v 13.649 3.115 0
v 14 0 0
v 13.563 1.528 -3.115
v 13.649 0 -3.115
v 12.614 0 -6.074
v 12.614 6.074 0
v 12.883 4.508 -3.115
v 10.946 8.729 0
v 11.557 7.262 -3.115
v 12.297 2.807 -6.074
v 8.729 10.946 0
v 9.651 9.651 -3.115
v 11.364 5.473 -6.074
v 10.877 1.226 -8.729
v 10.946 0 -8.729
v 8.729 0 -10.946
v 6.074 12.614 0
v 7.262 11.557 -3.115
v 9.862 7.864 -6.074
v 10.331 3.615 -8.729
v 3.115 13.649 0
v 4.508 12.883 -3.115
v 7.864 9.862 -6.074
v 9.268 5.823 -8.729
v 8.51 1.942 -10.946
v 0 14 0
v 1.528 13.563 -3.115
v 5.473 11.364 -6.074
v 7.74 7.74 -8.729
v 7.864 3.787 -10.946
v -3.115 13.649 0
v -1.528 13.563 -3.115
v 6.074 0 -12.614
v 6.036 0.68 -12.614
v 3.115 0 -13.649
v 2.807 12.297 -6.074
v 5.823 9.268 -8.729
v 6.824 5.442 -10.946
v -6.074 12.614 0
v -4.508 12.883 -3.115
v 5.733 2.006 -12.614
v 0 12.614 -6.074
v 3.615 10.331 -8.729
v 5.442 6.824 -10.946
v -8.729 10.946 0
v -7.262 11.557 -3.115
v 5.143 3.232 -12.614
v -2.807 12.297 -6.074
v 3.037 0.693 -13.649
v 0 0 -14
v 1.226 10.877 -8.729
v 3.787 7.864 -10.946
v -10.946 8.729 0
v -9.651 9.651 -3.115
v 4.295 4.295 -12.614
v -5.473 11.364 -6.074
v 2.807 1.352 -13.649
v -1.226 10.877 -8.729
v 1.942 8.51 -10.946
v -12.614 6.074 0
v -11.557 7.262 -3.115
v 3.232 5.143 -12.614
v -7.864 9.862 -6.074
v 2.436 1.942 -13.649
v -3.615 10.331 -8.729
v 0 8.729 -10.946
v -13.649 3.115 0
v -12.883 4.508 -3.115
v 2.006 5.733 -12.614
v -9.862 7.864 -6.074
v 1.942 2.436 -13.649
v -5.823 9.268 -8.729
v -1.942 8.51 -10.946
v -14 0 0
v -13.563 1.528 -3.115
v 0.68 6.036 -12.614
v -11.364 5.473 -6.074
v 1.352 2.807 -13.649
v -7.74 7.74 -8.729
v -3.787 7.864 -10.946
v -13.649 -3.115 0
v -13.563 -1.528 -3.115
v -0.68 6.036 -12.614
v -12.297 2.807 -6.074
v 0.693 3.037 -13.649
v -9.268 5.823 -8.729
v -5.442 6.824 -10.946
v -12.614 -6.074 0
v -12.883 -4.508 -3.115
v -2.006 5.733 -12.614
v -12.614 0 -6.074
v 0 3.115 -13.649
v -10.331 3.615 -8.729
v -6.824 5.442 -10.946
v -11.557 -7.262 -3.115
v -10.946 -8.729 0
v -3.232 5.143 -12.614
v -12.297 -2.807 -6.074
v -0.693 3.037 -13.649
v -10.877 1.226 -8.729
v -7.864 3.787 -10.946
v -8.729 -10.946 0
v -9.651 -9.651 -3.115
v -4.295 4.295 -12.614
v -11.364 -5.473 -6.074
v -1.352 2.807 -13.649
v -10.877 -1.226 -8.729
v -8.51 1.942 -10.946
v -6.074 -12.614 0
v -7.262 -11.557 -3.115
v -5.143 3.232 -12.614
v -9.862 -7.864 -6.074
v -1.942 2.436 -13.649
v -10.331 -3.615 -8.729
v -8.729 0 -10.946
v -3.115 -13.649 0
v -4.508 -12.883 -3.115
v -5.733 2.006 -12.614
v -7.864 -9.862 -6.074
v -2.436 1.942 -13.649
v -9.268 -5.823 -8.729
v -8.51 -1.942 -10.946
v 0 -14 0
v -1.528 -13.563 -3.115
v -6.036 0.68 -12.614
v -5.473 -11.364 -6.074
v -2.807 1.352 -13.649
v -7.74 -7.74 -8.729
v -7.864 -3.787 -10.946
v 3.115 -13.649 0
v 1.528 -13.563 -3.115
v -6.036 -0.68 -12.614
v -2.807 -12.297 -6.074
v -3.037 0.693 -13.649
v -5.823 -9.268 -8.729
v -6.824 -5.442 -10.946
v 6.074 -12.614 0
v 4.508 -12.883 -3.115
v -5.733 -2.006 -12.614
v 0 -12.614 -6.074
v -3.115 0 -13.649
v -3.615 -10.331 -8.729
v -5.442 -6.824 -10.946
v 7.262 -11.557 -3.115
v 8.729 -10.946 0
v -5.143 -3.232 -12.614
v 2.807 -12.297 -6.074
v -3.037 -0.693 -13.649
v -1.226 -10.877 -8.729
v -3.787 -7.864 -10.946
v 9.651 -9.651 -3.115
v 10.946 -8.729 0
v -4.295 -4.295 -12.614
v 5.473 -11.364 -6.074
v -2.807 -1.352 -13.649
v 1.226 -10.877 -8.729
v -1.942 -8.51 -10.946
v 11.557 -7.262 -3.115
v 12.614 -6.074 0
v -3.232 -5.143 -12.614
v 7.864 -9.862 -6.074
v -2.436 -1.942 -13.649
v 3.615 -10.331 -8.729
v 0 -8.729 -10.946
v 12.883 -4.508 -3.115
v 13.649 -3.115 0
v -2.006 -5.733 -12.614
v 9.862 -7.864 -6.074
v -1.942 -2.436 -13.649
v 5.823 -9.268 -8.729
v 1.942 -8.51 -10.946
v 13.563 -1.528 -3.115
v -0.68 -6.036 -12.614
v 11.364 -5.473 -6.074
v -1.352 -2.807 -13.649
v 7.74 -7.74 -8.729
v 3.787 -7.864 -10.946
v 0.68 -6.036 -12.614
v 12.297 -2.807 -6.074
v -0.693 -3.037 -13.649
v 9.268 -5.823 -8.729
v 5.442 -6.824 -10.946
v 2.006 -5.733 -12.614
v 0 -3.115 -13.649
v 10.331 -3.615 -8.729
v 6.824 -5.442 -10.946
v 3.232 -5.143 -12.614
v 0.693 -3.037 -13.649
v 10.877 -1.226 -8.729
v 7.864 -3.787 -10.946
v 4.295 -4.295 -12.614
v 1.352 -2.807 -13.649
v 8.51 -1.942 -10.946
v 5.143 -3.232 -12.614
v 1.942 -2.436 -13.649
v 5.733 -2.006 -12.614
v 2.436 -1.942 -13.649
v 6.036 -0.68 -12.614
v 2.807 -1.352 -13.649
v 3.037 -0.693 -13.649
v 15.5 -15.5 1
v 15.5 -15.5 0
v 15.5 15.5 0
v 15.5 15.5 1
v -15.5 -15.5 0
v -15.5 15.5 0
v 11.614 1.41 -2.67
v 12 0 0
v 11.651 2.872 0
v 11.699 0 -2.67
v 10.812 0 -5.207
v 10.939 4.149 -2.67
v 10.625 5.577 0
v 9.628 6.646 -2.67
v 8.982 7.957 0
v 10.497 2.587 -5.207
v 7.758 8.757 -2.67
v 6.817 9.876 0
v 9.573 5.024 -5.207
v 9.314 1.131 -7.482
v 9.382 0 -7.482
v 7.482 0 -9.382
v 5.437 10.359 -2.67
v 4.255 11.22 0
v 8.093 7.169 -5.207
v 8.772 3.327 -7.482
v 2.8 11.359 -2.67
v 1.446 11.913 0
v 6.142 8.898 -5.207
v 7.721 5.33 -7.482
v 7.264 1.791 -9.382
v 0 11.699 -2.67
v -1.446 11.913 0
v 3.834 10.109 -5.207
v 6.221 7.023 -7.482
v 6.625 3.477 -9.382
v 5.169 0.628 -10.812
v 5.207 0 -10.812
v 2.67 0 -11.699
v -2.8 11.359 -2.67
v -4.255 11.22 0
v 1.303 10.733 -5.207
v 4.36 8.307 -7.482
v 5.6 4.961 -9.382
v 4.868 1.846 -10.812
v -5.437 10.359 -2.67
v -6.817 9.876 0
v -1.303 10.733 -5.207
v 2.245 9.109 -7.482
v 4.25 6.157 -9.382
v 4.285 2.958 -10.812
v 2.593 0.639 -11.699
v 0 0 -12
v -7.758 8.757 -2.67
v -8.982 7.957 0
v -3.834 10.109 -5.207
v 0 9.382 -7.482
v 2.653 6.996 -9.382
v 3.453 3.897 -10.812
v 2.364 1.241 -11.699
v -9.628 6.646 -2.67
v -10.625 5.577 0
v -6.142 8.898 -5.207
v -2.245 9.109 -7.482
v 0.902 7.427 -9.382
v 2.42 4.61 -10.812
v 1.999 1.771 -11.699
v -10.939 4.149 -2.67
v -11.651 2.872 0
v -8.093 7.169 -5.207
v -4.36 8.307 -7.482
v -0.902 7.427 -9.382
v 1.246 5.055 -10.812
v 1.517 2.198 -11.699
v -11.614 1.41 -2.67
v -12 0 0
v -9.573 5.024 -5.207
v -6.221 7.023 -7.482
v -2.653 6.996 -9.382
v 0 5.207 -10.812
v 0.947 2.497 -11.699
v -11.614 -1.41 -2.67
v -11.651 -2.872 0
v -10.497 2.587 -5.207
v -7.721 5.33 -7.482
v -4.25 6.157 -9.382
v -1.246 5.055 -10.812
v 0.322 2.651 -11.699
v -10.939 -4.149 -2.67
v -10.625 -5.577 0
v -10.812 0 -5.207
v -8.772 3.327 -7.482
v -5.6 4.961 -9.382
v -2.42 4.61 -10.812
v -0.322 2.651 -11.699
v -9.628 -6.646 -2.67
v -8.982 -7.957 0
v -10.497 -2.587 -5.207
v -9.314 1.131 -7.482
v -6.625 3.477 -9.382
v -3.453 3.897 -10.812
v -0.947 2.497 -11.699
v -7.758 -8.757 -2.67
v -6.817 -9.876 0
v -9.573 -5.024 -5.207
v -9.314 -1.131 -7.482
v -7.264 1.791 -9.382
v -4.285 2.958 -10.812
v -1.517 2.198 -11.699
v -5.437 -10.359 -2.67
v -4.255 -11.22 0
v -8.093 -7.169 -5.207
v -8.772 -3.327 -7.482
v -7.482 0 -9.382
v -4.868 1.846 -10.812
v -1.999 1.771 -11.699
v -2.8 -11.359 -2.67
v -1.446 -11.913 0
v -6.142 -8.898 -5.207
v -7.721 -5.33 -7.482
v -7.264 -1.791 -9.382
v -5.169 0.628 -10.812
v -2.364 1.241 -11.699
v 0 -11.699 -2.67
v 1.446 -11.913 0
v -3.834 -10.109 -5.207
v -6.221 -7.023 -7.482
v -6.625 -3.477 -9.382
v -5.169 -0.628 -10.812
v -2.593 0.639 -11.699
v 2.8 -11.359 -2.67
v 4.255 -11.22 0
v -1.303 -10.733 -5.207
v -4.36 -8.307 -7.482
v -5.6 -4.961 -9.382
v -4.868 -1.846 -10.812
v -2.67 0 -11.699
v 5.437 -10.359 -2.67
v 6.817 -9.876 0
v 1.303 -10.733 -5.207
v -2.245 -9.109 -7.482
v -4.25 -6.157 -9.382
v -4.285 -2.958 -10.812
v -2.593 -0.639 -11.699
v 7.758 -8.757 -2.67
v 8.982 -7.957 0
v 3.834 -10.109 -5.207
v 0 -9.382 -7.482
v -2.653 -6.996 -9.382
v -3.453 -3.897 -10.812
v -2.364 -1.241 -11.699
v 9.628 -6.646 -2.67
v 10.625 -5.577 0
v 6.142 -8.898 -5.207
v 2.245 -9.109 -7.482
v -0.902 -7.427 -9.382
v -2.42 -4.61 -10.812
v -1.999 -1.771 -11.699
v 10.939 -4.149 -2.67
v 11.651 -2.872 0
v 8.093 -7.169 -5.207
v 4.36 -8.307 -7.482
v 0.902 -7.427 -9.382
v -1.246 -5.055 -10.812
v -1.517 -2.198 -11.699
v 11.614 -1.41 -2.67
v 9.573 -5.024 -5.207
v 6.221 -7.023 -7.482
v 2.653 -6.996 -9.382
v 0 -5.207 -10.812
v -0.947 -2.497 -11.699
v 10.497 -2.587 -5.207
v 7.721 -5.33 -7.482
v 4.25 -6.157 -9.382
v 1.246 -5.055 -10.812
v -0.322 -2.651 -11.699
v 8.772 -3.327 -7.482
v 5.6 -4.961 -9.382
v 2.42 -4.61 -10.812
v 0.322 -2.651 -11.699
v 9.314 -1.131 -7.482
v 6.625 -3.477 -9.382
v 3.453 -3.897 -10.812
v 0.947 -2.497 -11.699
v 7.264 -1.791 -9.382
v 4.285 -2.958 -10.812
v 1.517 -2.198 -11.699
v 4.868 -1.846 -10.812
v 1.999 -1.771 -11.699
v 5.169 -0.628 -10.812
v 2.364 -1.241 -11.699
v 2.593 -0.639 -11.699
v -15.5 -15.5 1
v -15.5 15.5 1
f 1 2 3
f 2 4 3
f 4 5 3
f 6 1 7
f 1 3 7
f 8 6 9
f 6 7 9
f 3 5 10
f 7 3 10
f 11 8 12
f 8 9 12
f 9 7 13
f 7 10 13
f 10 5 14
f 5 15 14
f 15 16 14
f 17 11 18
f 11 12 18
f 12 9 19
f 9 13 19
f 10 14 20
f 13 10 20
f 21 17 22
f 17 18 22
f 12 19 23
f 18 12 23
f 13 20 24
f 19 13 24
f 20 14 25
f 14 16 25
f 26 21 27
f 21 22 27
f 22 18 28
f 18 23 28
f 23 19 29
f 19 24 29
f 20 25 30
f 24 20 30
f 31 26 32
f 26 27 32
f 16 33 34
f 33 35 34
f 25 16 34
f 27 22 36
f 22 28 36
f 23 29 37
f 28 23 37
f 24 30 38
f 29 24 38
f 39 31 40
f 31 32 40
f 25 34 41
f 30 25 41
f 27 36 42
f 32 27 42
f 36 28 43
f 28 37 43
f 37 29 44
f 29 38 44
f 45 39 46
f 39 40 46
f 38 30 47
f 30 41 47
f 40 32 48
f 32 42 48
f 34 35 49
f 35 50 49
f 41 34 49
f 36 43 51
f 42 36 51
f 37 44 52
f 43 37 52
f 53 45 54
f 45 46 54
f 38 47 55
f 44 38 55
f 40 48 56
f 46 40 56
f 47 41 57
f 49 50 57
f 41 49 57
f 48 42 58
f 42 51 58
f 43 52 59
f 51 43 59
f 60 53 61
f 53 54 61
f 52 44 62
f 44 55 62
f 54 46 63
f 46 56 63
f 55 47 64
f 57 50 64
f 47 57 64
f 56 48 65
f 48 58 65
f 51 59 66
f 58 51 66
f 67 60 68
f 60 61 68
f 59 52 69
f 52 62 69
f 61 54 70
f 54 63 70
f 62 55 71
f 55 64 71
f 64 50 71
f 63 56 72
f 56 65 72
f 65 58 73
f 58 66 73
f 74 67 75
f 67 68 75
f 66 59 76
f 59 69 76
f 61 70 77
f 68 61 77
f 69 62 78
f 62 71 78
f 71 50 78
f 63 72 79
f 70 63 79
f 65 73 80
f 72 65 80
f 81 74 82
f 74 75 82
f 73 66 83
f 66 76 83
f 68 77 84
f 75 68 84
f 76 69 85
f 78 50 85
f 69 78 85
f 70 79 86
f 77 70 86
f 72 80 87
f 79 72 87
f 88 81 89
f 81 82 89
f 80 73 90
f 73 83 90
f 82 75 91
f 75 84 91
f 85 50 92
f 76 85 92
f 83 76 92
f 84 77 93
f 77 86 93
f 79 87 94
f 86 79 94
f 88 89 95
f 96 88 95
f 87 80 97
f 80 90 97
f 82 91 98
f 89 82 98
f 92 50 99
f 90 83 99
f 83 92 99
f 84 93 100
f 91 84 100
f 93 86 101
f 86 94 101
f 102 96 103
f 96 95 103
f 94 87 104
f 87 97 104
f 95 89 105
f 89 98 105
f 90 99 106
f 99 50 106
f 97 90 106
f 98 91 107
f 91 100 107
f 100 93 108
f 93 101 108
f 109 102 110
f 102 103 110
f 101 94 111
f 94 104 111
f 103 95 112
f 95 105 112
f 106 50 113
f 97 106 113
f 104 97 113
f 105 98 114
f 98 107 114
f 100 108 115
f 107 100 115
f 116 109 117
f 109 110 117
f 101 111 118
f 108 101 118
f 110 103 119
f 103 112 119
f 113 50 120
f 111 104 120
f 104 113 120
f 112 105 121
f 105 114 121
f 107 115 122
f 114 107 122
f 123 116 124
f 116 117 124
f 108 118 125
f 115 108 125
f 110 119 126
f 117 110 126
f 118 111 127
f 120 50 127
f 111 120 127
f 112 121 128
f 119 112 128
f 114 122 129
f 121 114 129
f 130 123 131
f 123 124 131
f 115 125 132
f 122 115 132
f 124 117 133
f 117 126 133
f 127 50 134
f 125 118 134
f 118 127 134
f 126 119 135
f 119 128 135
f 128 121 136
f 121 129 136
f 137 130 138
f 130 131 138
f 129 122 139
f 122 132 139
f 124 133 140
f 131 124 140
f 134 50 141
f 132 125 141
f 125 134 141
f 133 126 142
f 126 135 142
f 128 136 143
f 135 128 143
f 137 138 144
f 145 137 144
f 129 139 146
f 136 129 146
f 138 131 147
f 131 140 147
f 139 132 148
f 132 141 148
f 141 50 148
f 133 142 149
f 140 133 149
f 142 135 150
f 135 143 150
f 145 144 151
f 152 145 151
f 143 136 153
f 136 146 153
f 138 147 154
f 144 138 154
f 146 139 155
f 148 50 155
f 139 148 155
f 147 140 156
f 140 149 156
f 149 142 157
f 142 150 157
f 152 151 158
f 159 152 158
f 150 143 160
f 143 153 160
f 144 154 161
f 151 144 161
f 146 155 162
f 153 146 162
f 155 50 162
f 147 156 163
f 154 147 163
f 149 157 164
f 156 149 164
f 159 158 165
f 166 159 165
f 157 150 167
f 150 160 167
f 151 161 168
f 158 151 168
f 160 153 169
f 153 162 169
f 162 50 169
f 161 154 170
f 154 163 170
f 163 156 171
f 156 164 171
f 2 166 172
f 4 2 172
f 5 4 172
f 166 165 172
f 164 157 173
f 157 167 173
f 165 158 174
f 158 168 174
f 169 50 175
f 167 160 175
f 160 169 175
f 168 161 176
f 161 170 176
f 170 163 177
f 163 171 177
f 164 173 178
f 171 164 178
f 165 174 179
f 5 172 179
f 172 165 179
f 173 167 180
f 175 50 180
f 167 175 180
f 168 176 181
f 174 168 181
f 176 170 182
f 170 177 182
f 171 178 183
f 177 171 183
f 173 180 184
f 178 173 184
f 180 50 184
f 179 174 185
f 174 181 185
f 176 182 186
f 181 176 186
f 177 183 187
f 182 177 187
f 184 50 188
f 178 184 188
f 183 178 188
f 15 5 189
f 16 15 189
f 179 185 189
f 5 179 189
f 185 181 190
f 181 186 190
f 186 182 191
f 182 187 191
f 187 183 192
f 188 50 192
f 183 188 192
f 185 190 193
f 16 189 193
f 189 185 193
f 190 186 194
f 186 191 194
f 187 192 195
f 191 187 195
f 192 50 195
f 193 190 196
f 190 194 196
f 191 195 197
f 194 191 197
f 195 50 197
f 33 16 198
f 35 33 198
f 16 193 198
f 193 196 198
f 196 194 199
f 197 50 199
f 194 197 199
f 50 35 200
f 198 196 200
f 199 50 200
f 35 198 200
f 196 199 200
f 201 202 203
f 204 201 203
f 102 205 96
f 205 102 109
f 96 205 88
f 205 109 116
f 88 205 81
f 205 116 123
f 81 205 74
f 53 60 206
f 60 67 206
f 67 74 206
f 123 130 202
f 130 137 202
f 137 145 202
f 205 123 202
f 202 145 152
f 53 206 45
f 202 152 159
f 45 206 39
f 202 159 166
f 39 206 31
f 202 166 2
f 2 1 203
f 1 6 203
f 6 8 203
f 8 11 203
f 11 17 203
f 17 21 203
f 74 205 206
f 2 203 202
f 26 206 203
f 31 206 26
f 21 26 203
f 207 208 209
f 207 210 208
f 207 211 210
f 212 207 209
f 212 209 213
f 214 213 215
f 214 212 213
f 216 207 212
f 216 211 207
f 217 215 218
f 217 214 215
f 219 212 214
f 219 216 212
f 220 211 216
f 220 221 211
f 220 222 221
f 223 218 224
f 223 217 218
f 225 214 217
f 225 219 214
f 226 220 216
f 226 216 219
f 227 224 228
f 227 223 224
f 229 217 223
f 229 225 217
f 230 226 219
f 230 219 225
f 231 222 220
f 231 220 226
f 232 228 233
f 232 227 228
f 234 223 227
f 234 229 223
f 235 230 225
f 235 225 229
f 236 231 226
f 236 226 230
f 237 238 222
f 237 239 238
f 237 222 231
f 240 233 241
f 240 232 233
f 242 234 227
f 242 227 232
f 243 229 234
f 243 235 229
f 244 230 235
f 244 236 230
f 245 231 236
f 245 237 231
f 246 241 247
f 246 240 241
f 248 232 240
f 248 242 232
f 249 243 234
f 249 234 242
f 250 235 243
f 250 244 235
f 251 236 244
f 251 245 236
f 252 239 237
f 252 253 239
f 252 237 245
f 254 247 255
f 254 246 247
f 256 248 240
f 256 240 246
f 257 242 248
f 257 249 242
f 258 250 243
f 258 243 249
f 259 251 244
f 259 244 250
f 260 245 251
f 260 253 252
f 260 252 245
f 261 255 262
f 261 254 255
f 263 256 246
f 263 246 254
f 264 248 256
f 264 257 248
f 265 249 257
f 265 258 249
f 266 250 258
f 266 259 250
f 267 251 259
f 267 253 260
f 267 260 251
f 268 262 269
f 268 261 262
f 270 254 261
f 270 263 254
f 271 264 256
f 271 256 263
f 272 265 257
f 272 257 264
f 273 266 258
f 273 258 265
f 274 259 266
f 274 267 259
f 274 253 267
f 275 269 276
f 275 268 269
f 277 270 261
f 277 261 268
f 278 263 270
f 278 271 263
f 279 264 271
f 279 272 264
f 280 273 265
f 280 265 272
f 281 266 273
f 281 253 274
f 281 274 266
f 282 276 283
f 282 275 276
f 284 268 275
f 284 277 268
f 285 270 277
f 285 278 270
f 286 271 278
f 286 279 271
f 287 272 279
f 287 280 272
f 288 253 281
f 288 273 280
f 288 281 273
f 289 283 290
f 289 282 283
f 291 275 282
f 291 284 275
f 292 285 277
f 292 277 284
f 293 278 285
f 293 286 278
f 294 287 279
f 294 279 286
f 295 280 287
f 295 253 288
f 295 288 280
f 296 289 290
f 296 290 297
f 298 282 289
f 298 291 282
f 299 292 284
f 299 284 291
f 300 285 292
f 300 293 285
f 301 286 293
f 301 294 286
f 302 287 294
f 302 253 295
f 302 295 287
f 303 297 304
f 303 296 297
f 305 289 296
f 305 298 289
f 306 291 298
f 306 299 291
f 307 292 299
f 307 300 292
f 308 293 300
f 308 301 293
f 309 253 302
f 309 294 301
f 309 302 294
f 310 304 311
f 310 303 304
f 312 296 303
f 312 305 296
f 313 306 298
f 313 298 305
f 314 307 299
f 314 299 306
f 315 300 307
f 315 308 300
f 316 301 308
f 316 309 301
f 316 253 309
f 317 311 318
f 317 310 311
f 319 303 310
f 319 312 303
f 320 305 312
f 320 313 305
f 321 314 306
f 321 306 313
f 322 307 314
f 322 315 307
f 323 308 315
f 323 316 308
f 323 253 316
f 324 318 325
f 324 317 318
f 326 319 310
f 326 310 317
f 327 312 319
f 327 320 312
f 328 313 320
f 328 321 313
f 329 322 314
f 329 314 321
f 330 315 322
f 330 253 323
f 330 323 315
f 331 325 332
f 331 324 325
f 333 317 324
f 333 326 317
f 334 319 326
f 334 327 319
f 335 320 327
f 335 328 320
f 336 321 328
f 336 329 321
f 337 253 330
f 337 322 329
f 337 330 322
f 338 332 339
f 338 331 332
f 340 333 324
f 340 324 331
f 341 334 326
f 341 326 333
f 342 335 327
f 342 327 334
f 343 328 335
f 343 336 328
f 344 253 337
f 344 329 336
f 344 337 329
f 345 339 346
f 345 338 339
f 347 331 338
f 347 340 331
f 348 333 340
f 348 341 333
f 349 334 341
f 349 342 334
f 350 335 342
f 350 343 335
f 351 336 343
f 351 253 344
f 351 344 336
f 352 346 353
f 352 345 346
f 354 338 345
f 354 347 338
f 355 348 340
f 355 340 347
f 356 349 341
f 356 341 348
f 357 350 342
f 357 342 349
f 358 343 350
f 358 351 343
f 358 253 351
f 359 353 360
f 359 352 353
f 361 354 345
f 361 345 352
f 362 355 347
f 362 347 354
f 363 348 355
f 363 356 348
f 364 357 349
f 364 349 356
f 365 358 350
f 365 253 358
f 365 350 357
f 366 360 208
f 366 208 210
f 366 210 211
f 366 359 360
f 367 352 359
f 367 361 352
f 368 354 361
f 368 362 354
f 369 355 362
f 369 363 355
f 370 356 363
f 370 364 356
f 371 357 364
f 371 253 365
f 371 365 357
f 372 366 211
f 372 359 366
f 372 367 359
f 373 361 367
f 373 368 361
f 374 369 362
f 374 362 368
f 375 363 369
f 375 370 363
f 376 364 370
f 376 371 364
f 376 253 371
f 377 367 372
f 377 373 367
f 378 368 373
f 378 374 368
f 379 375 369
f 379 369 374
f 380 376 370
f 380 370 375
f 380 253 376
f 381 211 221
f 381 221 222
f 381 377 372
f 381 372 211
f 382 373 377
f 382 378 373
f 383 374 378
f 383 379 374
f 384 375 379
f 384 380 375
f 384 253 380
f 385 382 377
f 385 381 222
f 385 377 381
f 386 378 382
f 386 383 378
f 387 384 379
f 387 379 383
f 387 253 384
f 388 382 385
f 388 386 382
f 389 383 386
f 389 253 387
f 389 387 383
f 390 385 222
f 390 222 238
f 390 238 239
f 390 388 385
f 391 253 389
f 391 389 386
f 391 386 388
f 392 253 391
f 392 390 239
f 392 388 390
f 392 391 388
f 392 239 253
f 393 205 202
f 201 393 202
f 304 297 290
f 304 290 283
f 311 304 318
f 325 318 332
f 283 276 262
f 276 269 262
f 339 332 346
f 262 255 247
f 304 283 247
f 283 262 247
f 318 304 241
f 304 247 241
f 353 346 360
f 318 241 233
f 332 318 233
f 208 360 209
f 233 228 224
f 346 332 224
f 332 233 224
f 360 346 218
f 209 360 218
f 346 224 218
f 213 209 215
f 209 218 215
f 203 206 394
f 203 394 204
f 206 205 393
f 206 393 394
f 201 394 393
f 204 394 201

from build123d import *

# Parameters (mm, degrees)
SHELL1_T            = -2
SKETCH3_W           = 31
SKETCH3_H           = 31
BOSS_EXTRUDE1_DEPTH = 1


with BuildPart() as part:
    # Sketch1 → Revolve1 (revolve)
    with BuildSketch(Plane(origin=(0, 0, 0), x_dir=(1, 0, 0), z_dir=(0, 1, 0))):
        with BuildLine():
            Line((0, 14), (0, 0))
            Line((0, 0), (14, 0))
            ThreePointArc((14, 0), (9.899494937, 9.899494937), (0, 14))
        make_face()
    revolve(axis=Axis((0, 0, -14), (0, 0, 1)))

    # Shell1
    shell1_openings = [part.faces().sort_by_distance(p)[0] for p in [
        (0, 0, 0),
    ]]
    offset(amount=SHELL1_T, openings=shell1_openings, kind=Kind.INTERSECTION)

    # Sketch3 → Boss-Extrude1 (add)
    with BuildSketch(Plane.XY):
        Rectangle(SKETCH3_W, SKETCH3_H)
    extrude(amount=BOSS_EXTRUDE1_DEPTH)


solid = part.part
